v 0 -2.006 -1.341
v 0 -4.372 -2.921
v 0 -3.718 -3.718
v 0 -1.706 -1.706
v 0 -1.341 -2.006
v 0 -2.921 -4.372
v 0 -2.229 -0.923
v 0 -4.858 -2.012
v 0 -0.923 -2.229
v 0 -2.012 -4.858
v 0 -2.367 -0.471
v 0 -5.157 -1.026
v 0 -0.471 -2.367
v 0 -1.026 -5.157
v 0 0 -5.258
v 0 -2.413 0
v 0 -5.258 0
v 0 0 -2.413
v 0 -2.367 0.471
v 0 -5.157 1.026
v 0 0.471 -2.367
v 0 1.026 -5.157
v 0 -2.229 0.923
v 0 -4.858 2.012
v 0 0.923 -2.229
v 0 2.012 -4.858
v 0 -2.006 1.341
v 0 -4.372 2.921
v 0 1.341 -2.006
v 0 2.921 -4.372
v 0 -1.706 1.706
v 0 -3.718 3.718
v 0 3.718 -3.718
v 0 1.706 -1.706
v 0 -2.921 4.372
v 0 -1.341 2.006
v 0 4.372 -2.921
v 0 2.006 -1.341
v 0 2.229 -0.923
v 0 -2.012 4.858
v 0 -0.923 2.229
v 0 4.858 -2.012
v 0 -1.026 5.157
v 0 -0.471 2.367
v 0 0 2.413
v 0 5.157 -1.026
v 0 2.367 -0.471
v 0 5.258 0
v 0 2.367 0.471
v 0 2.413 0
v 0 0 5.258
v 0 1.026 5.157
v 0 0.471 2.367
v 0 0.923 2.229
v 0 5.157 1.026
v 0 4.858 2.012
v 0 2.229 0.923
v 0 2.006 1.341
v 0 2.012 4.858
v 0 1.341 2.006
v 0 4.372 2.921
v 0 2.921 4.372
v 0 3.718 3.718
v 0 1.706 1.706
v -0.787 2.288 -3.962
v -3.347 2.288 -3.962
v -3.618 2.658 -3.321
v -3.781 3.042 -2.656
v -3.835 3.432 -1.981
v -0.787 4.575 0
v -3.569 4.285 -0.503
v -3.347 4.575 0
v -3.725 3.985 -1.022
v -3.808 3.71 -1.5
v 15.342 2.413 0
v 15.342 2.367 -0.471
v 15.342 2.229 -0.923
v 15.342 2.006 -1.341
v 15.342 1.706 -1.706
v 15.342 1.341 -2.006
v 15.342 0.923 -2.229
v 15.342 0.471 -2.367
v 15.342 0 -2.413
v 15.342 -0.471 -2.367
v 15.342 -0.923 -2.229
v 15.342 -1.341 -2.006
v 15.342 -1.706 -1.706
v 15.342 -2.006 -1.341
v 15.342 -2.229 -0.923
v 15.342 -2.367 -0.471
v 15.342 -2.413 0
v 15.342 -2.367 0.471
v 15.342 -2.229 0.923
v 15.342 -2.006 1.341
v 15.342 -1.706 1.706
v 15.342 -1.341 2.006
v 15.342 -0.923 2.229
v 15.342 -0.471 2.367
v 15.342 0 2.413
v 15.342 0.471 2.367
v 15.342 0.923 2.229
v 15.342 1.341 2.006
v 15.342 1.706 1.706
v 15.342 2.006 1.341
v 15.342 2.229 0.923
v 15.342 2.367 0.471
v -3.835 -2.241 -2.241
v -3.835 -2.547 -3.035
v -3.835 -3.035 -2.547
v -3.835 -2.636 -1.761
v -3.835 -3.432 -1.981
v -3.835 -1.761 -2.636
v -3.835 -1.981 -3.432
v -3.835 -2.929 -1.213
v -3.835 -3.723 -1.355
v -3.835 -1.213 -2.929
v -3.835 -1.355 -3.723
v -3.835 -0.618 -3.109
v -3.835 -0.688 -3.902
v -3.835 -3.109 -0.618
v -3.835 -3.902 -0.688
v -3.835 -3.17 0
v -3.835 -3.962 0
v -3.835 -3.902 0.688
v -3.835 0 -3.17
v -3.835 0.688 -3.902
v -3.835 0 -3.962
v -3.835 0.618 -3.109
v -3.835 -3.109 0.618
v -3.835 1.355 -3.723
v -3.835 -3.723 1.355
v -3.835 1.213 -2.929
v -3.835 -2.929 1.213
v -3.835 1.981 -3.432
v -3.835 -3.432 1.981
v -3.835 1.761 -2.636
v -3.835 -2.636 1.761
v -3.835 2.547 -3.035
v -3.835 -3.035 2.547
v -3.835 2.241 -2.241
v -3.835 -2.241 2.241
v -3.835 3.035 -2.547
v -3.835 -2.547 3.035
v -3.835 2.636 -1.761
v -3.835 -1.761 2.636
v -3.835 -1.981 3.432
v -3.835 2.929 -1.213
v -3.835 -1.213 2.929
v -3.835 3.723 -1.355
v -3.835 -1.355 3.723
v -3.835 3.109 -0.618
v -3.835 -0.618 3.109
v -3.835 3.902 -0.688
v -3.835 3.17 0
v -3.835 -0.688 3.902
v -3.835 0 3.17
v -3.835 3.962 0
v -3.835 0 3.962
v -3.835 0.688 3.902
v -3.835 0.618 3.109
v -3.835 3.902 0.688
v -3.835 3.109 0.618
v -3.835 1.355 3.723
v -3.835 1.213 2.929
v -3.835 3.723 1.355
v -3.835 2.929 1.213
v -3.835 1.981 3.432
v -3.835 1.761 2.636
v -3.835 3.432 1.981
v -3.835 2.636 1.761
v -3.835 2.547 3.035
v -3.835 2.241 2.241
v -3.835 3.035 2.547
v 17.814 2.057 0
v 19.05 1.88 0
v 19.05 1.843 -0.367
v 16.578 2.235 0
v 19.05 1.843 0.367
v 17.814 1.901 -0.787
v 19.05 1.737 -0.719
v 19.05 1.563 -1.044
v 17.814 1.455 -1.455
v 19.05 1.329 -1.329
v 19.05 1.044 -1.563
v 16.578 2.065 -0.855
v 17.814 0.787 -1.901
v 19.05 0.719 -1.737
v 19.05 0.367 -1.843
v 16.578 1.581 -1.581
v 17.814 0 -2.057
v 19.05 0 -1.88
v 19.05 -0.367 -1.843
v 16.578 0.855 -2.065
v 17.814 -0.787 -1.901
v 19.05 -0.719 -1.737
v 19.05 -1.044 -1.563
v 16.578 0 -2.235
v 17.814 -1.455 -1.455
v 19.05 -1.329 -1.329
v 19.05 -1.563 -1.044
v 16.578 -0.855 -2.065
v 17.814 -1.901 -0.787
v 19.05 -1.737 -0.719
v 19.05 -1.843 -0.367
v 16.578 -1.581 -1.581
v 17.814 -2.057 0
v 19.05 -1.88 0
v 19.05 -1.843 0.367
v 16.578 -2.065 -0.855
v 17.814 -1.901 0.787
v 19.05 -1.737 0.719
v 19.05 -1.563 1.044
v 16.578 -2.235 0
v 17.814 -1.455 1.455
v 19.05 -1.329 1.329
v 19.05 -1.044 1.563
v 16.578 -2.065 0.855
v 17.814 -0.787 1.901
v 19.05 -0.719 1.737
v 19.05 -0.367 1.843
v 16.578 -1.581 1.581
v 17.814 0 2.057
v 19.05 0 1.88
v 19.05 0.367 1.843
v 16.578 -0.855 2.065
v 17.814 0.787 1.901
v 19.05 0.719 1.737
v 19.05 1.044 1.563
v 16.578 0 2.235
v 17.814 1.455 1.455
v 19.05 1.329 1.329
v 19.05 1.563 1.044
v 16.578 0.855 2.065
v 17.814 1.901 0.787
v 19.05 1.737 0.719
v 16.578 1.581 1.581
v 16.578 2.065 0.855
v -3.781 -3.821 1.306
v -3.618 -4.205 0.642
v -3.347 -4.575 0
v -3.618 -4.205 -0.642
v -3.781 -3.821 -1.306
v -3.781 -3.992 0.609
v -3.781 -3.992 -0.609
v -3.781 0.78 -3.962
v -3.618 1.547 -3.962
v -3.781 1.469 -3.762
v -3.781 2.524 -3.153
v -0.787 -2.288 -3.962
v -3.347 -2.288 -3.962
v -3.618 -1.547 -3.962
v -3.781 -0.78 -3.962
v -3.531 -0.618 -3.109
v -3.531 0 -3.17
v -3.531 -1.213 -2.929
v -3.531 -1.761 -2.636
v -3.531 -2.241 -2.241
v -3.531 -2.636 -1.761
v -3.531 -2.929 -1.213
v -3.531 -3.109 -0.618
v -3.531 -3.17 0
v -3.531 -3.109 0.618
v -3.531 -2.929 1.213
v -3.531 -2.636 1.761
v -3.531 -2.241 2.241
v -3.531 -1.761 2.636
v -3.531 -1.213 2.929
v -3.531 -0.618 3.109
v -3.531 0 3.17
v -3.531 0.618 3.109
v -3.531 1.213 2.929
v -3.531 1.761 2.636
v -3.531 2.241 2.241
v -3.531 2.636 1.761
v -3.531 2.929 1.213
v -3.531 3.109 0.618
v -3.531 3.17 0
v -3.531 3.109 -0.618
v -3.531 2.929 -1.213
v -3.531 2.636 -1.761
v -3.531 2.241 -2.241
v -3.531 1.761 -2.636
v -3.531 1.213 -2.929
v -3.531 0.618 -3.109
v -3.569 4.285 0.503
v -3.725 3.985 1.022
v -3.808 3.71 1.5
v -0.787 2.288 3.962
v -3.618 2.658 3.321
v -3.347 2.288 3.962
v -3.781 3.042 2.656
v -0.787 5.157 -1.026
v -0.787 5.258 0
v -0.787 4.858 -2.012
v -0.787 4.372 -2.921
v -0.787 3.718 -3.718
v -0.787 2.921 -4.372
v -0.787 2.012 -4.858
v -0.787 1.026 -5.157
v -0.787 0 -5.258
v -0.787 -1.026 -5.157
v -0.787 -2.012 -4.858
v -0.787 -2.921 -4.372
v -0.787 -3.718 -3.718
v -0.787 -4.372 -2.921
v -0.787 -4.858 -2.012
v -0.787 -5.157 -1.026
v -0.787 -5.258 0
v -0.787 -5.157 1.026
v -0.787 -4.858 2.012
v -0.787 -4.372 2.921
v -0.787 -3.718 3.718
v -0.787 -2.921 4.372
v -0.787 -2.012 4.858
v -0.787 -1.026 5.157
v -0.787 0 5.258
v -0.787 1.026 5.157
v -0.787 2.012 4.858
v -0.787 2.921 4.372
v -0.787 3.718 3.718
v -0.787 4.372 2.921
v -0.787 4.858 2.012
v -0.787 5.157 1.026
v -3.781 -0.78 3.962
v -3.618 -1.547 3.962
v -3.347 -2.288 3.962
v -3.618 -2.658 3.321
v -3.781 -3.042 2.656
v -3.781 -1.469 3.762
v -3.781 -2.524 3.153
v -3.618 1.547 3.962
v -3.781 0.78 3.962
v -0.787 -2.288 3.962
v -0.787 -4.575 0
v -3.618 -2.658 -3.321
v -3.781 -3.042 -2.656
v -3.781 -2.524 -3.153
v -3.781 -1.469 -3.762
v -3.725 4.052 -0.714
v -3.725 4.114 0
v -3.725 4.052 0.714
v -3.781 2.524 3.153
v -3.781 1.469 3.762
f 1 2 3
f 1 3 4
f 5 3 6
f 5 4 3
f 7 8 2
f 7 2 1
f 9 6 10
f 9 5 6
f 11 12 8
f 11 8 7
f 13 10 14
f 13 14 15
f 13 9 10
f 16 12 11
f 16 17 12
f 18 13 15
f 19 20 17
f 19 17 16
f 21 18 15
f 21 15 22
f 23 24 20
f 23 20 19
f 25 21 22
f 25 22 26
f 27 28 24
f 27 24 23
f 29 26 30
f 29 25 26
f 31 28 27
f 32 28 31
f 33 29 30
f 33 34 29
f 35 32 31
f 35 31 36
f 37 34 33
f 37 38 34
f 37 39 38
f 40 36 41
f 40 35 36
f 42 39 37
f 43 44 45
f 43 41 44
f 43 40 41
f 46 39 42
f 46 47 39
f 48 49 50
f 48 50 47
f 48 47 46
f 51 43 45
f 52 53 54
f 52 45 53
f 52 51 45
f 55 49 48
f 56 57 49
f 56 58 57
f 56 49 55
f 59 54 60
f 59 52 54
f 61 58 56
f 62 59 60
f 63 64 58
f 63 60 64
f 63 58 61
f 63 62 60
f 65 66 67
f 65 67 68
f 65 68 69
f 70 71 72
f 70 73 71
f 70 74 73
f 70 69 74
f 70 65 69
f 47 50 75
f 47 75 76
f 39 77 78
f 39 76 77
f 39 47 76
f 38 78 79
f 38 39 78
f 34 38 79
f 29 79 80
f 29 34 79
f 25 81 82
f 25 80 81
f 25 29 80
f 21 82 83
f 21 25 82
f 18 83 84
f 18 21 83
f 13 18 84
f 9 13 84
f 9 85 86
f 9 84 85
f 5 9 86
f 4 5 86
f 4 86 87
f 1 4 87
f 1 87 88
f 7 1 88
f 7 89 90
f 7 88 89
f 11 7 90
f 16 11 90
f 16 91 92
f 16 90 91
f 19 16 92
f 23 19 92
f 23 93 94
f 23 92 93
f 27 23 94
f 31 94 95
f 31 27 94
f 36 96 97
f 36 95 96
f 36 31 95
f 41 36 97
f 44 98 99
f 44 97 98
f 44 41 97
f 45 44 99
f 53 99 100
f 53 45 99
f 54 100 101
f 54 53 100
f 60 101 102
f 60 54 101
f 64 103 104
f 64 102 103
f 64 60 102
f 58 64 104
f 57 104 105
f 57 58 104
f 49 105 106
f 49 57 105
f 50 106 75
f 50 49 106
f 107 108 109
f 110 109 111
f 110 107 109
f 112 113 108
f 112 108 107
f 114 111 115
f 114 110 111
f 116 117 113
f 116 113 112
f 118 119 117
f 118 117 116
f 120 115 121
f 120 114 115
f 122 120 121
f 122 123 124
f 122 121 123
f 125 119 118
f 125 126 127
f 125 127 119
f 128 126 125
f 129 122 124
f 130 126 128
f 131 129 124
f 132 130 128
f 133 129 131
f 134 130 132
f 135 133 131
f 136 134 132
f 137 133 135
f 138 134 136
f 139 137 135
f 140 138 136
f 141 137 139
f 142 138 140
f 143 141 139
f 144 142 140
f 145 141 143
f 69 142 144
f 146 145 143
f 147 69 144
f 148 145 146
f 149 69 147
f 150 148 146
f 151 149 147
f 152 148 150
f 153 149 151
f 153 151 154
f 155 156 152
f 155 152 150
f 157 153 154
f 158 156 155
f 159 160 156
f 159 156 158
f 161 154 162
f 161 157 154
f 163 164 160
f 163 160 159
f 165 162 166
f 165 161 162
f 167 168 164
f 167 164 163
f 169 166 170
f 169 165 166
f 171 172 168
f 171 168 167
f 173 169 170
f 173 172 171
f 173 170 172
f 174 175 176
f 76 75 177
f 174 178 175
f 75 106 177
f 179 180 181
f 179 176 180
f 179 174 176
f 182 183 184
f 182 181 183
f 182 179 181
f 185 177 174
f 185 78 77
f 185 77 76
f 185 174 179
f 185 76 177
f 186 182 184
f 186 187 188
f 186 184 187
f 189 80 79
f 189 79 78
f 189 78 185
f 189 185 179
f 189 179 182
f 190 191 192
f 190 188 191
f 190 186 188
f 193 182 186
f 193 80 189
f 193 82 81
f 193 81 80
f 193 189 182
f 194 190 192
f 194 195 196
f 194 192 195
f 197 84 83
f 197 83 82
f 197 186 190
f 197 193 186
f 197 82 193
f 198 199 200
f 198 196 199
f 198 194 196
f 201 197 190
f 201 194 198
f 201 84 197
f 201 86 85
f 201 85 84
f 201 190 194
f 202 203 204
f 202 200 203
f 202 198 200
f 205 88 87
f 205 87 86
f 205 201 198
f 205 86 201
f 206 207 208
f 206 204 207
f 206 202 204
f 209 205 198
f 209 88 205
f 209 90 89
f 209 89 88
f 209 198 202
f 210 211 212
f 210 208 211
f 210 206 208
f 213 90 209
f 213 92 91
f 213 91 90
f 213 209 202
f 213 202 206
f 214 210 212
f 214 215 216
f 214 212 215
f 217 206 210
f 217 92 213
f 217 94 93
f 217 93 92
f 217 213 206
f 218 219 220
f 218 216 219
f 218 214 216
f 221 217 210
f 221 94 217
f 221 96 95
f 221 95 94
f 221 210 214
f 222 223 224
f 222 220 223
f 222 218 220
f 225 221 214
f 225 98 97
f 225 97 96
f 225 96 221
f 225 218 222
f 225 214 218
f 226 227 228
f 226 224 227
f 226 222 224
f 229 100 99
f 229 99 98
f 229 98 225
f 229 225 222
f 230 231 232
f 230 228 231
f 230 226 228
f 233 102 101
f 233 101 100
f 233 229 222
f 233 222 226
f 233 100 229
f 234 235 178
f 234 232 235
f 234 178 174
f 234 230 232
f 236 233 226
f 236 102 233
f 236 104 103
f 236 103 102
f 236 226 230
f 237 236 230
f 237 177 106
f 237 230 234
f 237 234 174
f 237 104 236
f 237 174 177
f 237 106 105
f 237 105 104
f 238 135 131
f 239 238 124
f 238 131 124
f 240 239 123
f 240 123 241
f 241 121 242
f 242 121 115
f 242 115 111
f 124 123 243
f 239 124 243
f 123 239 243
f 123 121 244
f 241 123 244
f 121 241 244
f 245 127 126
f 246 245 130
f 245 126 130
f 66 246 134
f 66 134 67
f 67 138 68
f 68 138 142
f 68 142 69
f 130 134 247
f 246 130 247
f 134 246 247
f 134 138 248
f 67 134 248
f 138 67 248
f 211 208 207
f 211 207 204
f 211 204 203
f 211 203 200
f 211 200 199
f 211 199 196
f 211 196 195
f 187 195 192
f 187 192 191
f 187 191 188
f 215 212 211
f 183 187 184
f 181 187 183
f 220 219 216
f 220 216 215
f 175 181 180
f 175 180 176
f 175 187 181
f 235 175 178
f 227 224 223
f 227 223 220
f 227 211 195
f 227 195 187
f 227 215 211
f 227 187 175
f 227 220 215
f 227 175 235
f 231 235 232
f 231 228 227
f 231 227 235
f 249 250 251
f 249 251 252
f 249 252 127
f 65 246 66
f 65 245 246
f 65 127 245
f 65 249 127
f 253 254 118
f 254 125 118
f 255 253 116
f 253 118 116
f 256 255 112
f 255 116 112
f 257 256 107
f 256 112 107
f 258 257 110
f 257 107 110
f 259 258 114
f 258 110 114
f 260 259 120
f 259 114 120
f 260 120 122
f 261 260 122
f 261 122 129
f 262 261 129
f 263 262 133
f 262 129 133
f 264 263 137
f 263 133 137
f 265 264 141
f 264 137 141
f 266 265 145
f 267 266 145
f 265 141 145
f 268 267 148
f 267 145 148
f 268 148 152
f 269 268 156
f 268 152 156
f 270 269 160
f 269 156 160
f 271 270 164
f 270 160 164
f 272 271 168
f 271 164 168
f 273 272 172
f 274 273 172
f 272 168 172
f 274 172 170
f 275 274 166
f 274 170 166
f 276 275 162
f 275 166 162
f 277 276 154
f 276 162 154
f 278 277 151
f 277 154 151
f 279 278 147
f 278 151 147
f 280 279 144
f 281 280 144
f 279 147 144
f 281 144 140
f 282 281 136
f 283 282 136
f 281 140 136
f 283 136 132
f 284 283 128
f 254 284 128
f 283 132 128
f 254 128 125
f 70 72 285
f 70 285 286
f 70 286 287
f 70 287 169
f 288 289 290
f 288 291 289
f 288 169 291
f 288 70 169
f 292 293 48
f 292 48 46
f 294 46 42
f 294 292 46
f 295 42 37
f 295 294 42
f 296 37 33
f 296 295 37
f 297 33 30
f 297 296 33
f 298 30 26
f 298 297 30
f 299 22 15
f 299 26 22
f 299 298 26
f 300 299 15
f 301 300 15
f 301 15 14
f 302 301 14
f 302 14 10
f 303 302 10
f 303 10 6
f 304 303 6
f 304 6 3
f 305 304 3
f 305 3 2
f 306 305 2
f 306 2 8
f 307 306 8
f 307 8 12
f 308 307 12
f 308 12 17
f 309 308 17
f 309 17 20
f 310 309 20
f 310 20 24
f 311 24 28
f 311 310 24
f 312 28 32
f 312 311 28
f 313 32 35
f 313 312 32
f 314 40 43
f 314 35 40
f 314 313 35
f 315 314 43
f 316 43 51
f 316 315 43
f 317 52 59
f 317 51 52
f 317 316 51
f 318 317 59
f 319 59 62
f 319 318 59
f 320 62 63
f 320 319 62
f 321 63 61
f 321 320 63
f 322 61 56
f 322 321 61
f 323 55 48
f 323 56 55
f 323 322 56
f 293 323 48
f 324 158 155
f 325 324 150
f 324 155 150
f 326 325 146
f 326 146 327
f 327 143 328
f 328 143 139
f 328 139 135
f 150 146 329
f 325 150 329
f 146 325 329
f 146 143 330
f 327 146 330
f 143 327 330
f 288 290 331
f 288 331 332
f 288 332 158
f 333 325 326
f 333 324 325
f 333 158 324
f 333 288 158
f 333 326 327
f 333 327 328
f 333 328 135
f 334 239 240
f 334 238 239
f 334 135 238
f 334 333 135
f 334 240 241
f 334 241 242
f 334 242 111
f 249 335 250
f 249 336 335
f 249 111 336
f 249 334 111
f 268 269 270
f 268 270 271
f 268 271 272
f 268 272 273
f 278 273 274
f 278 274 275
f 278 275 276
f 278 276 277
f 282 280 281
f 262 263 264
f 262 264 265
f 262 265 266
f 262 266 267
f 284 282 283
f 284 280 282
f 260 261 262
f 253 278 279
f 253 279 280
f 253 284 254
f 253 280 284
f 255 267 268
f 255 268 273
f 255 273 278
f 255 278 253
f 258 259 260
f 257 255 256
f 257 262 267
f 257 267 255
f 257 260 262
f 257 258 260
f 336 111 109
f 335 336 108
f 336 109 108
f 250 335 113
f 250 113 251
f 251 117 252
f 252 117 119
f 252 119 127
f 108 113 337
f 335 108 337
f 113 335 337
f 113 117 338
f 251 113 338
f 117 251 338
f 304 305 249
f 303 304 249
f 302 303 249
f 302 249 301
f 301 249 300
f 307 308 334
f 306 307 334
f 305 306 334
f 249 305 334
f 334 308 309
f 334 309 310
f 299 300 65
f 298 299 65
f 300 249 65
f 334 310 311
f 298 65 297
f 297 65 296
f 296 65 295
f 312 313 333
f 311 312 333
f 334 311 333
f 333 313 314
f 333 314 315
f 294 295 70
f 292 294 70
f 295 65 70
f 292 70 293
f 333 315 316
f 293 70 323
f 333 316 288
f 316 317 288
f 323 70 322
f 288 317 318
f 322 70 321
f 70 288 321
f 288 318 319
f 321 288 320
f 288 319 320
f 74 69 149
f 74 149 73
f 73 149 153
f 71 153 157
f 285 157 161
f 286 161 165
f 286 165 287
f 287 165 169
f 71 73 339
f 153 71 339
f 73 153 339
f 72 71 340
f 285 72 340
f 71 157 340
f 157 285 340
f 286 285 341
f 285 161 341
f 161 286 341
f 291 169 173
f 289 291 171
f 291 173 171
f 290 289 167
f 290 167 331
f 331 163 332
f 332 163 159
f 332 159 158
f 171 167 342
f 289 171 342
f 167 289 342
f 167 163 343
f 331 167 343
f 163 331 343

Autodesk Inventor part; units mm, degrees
ref_plane "YZ Plane" through (0, 0, 0) normal (1, 0, 0) x (0, 1, 0)
sketch "Sketch1" plane through (0, 0, 0) normal (0, 0, 1) x (1, 0, 0)
  line L0 (-0.7874, 5.2578) -> (-0.7874, 0)
  line L1 (-0.7874, 0) -> (19.05, 0)
  line L2 (19.05, 0) -> (19.05, 2.413)
  line L3 (19.05, 2.413) -> (0, 2.413)
  line L4 (0, 2.413) -> (0, 5.2578)
  line L5 (-4.7549, 0) -> (23.0175, 0) projected
  line L6 (0, -1.0516) -> (0, 6.3094) projected
  line L7 (0, 5.2578) -> (-0.7874, 5.2578)
  dimension "d1" = 0.7874
  dimension "d2" = 4.826
  dimension "d3" = 19.05
  dimension "d22" = 10.5156
revolve "Body" add sketch "Sketch1" angle 360 about axis through (-0.7874, 0, 0) along (1, 0, 0)
sketch "Sketch2" plane through (-0.7874, 0, 0) normal (-1, 0, 0) x (0, 0, 1)
  line L0 (0, 4.5754) -> (3.9624, 2.2877)
  line L1 (3.9624, 2.2877) -> (3.9624, -2.2877)
  line L2 (3.9624, -2.2877) -> (0, -4.5754)
  line L3 (0, -4.5754) -> (-3.9624, -2.2877)
  line L4 (-3.9624, -2.2877) -> (-3.9624, 2.2877)
  line L5 (-3.9624, 2.2877) -> (0, 4.5754)
  circle A0 centre (0, 0) radius 5.2578 projected
  dimension "d11" = 7.9248
extrude "Head" add sketch "Sketch2" along normal blind 3.048 contours L0 L1 L2 L3 L4 L5
ref_plane "IDS_WORKPLANE{1}" through (-3.8354, 0, 0) normal (-1, 0, 0) x (0, 0, -1)
sketch "Sketch3" plane through (-3.8354, 0, 0) normal (-1, 0, 0) x (0, 0, -1)
  circle A0 centre (0, 0) radius 3.1699
  point P0 (0, 0)
  dimension "d15" = 6.3398
extrude "Indent" cut sketch "Sketch3" against normal blind 0.3048
thread "Thread" size "10-24 UNC" class "2A" standard "ANSI Unified Screw Threads" length 19.05
sketch "Sketch4" plane through (0, 0, 0) normal (0, 0, 1) x (1, 0, 0)
  line L0 (-3.8354, 3.9624) -> (-3.8354, 4.5754)
  line L1 (-3.8354, 4.5754) -> (-3.3472, 4.5754)
  line L2 (-3.8354, 4.5754) -> (-3.8354, 2.2877) projected
  line L3 (-4.9666, 0) -> (2.8908, 0) projected
  line L4 (-0.7874, 4.5754) -> (-3.8354, 4.5754) projected
  arc A0 (-3.3472, 4.5754) -> (-3.8354, 3.9624) centre (1.7683, 0) ccw
  dimension "d21" = 7.9248
  dimension "d23" = 6.8631
revolve "Chamfer1" cut sketch "Sketch4" angle 360 about axis through (-10, 0, 0) along (1, 0, 0)
chamfer "Chamfer2" distance 0.5334 distance2 3.7084 1 edges at (19.05, -2.413, 0) measured on face at (19.05, -0.4641, 1.0929)
ref_plane "Work Plane3" through (7, 0, 0) normal (0, 0, -1) x (1, 0, 0)
equation "\"d11\" = SW"
equation "\"d12\" = KOH"
equation "\"d15\" = SD3"
equation "\"d16\" = SB"
equation "\"d6\" = GEL"
equation "\"d19\" = -0.5 * GD2 + 0.5 * NND"
equation "\"d20\" = SPTZ"
equation "\"d1\" = SD"
equation "\"d2\" = NND"
equation "\"d3\" = NLG"
equation "\"d22\" = SD2"
equation "\"d21\" = SW"
equation "\"d23\" = 0.866025 * SW"
equation "\"NLG\" = 19.05"
equation "\"NND\" = 4.826"
equation "\"KOH\" = 3.048"
equation "\"GEL\" = 19.05"
equation "\"SW\" = 7.9248"
equation "\"GD2\" = 3.7592"
equation "\"SPTZ\" = 3.7084"
equation "\"SD3\" = 0.8 * SW"
equation "\"SB\" = 0.1 * KOH"
equation "\"SD2\" = 10.5156"
equation "\"SD\" = 0.7874"
equation "\"GD1\" = 3.7592"
equation "\"THREADDIA\" = 4.826"
equation "\"TOA\" = 30deg"
equation "\"E0\" = 9.15077"
properties part number "am-1165" material "Steel, Mild"
